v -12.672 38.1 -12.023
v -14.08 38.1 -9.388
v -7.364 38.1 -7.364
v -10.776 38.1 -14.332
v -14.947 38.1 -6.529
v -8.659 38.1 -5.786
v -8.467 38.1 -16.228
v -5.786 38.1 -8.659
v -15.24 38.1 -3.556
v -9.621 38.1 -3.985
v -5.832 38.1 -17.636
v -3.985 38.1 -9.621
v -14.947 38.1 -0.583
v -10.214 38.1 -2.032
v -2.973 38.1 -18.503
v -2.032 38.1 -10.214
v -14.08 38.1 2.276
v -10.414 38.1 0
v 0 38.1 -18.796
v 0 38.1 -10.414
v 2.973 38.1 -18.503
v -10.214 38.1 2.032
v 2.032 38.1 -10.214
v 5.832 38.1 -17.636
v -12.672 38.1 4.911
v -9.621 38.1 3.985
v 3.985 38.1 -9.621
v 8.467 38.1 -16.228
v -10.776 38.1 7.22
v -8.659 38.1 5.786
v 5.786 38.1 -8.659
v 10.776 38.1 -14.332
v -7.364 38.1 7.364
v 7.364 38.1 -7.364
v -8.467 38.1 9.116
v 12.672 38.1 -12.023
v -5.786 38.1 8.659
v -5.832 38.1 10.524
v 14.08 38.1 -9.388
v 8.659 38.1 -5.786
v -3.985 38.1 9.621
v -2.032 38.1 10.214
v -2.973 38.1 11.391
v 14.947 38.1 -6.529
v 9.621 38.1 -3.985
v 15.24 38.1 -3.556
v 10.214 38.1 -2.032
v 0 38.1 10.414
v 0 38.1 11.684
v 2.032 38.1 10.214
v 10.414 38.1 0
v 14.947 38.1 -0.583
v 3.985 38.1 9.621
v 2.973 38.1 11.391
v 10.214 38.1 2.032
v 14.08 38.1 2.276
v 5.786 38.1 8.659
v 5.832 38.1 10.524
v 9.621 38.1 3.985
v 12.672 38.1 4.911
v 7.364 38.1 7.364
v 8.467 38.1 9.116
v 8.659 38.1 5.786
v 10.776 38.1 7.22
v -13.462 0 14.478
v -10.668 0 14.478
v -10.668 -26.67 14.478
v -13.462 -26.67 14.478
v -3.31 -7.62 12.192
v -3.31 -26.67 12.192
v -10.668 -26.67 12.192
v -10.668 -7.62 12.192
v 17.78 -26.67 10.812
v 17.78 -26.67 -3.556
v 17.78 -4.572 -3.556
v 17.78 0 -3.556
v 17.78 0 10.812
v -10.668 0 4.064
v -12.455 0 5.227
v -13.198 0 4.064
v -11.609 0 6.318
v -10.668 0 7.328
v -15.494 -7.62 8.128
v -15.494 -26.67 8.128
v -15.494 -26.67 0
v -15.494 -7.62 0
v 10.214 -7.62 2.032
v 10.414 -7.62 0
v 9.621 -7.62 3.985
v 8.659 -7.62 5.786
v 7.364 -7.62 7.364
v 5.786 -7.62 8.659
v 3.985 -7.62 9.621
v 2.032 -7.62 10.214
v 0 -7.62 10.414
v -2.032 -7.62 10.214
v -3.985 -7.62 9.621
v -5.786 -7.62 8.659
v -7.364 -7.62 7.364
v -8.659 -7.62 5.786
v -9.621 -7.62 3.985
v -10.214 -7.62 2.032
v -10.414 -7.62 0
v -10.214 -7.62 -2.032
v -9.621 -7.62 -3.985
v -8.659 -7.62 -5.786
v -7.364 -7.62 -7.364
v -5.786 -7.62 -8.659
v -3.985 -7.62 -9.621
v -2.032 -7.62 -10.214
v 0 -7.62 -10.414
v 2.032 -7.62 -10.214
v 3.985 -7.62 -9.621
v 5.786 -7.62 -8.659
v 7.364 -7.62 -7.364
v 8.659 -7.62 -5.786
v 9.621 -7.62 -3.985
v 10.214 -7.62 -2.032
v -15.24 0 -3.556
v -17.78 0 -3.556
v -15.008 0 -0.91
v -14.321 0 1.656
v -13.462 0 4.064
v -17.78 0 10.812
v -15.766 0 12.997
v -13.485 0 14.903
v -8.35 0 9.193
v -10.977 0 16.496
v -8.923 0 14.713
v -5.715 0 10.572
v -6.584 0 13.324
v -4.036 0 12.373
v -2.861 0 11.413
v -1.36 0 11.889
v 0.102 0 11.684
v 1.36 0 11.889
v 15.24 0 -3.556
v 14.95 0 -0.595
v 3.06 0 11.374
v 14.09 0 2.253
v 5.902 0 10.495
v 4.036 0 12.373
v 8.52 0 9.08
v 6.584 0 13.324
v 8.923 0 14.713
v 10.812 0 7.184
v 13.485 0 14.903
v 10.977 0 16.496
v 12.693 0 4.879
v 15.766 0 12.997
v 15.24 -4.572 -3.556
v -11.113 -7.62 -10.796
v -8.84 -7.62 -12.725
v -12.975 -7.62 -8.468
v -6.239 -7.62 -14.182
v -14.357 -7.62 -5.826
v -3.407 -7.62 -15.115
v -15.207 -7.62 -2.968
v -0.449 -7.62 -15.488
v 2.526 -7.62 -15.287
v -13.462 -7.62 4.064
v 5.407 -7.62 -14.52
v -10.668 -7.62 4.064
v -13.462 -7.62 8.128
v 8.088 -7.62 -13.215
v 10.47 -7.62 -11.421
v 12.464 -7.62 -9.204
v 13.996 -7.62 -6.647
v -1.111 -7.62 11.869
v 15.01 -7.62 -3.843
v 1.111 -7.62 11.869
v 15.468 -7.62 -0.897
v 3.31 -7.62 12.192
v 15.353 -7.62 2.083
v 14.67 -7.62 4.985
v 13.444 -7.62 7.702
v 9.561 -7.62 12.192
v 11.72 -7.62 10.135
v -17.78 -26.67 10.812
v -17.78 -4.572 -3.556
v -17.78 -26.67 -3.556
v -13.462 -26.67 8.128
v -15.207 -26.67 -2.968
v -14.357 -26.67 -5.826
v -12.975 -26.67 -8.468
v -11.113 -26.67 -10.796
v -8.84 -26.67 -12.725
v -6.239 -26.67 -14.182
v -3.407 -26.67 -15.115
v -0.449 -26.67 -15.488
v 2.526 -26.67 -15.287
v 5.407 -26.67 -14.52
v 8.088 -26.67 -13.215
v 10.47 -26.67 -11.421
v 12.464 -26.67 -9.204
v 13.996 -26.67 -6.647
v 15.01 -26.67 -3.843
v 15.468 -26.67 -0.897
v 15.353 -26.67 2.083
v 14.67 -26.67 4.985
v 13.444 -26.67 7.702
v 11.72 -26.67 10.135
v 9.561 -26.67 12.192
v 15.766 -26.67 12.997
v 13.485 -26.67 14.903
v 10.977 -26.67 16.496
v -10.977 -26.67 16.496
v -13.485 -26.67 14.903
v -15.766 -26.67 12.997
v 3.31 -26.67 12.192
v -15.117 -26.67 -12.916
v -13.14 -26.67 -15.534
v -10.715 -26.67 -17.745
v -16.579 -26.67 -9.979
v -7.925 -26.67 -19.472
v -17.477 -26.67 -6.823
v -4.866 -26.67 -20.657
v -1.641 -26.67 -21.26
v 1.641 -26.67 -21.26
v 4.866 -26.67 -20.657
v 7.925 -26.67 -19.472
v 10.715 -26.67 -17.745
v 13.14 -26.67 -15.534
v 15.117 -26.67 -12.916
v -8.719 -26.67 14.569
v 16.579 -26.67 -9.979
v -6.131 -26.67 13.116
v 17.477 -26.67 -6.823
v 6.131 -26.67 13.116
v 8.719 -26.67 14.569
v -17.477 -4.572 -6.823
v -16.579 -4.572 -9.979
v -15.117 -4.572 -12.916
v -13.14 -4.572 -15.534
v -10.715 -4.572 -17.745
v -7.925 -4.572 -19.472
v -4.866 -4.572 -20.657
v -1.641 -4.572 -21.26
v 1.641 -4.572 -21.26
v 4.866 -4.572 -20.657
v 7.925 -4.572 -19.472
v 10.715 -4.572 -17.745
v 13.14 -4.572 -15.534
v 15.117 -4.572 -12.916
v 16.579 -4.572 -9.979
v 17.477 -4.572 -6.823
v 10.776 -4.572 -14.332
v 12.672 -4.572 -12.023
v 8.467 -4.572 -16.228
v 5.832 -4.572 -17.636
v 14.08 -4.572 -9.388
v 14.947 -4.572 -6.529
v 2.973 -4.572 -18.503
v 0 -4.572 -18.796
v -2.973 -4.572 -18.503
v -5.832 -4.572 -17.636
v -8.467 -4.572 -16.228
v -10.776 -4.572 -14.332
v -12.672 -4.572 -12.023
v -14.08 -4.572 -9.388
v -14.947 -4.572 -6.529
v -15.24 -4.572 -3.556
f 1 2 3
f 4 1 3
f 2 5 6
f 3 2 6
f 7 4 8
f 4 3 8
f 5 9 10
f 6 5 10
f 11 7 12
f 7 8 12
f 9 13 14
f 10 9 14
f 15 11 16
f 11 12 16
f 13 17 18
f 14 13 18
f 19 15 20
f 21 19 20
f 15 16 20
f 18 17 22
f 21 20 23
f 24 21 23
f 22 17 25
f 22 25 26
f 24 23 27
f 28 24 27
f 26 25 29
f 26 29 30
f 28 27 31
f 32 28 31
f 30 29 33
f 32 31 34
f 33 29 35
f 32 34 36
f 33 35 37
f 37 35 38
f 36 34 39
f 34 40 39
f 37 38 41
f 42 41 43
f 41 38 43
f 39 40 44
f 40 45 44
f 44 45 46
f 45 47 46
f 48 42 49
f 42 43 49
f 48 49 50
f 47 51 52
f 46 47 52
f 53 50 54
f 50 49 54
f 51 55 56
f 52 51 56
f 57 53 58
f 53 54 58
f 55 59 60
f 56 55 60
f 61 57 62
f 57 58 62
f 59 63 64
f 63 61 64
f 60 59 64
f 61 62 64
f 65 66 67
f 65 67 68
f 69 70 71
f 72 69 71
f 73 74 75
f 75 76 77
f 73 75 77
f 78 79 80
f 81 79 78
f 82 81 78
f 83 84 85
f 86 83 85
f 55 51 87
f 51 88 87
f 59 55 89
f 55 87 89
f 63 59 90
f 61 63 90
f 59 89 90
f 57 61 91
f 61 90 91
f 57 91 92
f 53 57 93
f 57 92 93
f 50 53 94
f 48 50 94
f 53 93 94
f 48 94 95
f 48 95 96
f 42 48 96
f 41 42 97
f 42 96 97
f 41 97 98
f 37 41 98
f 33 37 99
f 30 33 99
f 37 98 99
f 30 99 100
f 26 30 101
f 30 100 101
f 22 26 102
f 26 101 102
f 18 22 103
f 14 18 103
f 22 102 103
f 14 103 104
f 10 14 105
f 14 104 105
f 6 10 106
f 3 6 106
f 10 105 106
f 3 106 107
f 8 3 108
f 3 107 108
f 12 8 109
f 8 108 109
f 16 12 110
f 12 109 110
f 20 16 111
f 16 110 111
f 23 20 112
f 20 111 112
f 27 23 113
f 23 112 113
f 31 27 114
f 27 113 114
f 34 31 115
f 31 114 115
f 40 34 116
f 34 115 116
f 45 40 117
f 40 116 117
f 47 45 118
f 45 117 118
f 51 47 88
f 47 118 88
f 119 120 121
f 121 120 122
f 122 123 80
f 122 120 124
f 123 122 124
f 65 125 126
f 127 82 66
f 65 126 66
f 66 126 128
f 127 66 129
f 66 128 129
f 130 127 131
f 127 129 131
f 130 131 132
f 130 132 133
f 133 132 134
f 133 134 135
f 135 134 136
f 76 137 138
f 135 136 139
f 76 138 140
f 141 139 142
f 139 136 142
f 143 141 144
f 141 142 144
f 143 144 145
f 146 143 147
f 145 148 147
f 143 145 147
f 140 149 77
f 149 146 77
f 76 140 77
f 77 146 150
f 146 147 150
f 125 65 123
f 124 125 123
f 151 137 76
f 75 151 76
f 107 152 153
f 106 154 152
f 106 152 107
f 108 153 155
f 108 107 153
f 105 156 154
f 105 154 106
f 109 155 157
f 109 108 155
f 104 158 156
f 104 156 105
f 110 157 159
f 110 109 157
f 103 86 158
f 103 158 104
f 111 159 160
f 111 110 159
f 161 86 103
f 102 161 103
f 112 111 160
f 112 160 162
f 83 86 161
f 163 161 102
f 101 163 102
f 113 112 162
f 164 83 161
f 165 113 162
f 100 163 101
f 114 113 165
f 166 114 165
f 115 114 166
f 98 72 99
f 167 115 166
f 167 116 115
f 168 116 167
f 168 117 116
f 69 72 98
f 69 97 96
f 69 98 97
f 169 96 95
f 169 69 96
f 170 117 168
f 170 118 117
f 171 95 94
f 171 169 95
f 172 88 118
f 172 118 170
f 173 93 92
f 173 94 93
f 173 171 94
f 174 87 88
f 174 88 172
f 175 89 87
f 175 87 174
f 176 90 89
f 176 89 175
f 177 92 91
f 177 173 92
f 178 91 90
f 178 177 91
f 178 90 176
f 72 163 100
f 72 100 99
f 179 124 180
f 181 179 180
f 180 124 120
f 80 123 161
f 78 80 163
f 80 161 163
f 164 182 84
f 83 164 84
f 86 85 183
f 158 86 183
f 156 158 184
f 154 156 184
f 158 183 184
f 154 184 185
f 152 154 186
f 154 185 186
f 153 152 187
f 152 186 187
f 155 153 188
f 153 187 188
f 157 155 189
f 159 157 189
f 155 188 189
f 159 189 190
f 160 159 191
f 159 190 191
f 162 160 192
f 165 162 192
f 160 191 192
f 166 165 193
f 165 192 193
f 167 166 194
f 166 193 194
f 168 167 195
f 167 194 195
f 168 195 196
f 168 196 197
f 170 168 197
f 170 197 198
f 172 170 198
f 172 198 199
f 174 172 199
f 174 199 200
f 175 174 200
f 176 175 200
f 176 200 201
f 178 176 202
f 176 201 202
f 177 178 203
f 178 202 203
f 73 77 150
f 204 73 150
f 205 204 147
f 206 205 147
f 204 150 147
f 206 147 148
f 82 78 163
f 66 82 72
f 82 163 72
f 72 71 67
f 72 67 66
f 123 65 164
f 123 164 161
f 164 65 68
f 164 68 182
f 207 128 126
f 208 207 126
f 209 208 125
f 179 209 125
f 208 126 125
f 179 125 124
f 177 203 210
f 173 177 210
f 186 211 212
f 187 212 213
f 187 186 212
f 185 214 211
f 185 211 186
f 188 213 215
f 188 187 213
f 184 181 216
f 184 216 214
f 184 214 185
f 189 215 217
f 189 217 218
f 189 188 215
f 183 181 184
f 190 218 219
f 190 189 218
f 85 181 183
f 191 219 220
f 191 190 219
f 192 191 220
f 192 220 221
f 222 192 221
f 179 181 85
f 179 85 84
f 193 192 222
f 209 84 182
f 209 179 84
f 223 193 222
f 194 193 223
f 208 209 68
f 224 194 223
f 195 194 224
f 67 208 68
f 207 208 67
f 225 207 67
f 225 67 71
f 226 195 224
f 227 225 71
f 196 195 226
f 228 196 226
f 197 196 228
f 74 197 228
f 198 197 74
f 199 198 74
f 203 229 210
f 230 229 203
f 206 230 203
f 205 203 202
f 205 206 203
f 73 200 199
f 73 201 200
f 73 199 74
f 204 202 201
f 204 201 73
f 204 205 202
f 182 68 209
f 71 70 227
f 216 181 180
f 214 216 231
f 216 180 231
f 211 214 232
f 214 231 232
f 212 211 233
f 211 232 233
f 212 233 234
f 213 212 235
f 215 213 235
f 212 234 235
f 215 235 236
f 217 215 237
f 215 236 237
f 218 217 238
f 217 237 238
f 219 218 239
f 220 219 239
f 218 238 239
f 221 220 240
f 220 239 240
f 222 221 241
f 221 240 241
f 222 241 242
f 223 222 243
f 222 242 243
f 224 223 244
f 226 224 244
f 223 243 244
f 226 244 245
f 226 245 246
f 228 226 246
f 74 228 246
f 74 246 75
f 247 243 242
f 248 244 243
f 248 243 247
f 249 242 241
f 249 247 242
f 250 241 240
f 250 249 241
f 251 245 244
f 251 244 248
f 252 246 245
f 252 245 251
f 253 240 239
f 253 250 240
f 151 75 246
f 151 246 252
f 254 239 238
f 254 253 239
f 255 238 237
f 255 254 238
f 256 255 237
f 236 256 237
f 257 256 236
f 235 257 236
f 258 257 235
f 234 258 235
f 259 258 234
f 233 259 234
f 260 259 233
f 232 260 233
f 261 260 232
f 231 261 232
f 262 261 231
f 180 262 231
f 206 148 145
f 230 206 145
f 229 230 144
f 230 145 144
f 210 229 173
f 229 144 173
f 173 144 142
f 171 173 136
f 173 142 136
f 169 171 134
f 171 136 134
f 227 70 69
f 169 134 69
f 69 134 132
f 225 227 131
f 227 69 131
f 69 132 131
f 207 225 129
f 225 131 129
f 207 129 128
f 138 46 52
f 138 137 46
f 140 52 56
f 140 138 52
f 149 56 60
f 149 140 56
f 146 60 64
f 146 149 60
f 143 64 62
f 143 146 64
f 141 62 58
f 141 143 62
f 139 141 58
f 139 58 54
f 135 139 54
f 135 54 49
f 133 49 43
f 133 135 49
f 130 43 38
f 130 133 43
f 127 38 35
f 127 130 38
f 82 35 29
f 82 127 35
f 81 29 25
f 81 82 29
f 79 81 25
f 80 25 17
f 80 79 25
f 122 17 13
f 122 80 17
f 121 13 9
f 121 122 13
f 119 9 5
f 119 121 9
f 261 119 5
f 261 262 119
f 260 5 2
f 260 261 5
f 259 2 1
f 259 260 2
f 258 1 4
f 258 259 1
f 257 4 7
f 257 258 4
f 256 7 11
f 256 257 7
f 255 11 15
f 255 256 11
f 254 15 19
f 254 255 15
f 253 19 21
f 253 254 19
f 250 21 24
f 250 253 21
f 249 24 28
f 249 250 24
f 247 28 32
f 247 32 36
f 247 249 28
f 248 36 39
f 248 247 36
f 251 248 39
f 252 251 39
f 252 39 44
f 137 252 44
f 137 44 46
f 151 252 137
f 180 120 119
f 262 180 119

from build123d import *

# Parameters (mm, degrees)
F0_R     = 15.24
F0_R_2   = 10.414
F1_DEPTH = 26.67
F2_DEPTH = 38.1
F4_DEPTH = 26.67
F3_R     = 10.414
F5_DEPTH = 19.05
F7_DEPTH = 4.572


with BuildPart() as f1:
    # F0 (on Front) → F1 (new body)
    with BuildSketch(Plane.XZ):
        with BuildLine():
            Line((-17.78, 10.8124097937), (-17.78, -3.556))
            ThreePointArc((-17.78, -3.556), (0, -21.336), (17.78, -3.556))
            Line((17.78, -3.556), (17.78, 10.8124097937))
            ThreePointArc((17.78, 10.8124097937), (14.6565413174, 13.9872436172), (10.9767640135, 16.4961882046))
            ThreePointArc((10.9767640135, 16.4961882046), (0, 11.8282387054), (-10.9767640135, 16.4961882046))
            ThreePointArc((-10.9767640135, 16.4961882046), (-14.6565413174, 13.9872436172), (-17.78, 10.8124097937))
        make_face()
        with Locations((0, -3.556)):
            Circle(F0_R, mode=Mode.SUBTRACT)
        with Locations((0, -3.556)):
            Circle(F0_R)
        Circle(F0_R_2, mode=Mode.SUBTRACT)
    extrude(amount=F1_DEPTH)

    # F0 (on Front) → F2 (join)
    with BuildSketch(Plane.XZ):
        with Locations((0, -3.556)):
            Circle(F0_R)
        Circle(F0_R_2, mode=Mode.SUBTRACT)
    extrude(amount=-F2_DEPTH)

    # F3 (on face) → F4 (cut)
    with BuildSketch(Plane.XZ.offset(26.67)):
        Polygon((-13.462, 14.478), (-13.462, 8.128), (-13.462, 4.064), (-10.668, 4.064), (-10.668, 12.192), (-10.668, 14.478), align=None)
    extrude(amount=-F4_DEPTH, mode=Mode.SUBTRACT)

    # F3 (on face) → F5 (cut)
    with BuildSketch(Plane.XZ.offset(26.67)):
        with BuildLine():
            Line((-15.494, 8.128), (-15.494, 0))
            ThreePointArc((-15.494, 0), (6.7794053956, -13.9321103384), (9.5613373542, 12.192))
            Line((9.5613373542, 12.192), (3.3098522596, 12.192))
            ThreePointArc((3.3098522596, 12.192), (0, 11.8282387054), (-3.3098522596, 12.192))
            Line((-3.3098522596, 12.192), (-10.668, 12.192))
            Line((-10.668, 12.192), (-10.668, 4.064))
            Line((-10.668, 4.064), (-13.462, 4.064))
            Line((-13.462, 4.064), (-13.462, 8.128))
            Line((-13.462, 8.128), (-15.494, 8.128))
        make_face()
        Circle(F3_R, mode=Mode.SUBTRACT)
    extrude(amount=-F5_DEPTH, mode=Mode.SUBTRACT)

    # F6 (on face) → F7 (cut)
    with BuildSketch(Plane(origin=(0, 0, 0), x_dir=(-1, 0, 0), z_dir=(0, 1, 0))):
        with BuildLine():
            Line((-15.24, -3.556), (-17.78, -3.556))
            ThreePointArc((-17.78, -3.556), (0, -21.336), (17.78, -3.556))
            Line((17.78, -3.556), (15.24, -3.556))
            ThreePointArc((15.24, -3.556), (0, -18.796), (-15.24, -3.556))
        make_face()
    extrude(amount=-F7_DEPTH, mode=Mode.SUBTRACT)


solid = f1.part
